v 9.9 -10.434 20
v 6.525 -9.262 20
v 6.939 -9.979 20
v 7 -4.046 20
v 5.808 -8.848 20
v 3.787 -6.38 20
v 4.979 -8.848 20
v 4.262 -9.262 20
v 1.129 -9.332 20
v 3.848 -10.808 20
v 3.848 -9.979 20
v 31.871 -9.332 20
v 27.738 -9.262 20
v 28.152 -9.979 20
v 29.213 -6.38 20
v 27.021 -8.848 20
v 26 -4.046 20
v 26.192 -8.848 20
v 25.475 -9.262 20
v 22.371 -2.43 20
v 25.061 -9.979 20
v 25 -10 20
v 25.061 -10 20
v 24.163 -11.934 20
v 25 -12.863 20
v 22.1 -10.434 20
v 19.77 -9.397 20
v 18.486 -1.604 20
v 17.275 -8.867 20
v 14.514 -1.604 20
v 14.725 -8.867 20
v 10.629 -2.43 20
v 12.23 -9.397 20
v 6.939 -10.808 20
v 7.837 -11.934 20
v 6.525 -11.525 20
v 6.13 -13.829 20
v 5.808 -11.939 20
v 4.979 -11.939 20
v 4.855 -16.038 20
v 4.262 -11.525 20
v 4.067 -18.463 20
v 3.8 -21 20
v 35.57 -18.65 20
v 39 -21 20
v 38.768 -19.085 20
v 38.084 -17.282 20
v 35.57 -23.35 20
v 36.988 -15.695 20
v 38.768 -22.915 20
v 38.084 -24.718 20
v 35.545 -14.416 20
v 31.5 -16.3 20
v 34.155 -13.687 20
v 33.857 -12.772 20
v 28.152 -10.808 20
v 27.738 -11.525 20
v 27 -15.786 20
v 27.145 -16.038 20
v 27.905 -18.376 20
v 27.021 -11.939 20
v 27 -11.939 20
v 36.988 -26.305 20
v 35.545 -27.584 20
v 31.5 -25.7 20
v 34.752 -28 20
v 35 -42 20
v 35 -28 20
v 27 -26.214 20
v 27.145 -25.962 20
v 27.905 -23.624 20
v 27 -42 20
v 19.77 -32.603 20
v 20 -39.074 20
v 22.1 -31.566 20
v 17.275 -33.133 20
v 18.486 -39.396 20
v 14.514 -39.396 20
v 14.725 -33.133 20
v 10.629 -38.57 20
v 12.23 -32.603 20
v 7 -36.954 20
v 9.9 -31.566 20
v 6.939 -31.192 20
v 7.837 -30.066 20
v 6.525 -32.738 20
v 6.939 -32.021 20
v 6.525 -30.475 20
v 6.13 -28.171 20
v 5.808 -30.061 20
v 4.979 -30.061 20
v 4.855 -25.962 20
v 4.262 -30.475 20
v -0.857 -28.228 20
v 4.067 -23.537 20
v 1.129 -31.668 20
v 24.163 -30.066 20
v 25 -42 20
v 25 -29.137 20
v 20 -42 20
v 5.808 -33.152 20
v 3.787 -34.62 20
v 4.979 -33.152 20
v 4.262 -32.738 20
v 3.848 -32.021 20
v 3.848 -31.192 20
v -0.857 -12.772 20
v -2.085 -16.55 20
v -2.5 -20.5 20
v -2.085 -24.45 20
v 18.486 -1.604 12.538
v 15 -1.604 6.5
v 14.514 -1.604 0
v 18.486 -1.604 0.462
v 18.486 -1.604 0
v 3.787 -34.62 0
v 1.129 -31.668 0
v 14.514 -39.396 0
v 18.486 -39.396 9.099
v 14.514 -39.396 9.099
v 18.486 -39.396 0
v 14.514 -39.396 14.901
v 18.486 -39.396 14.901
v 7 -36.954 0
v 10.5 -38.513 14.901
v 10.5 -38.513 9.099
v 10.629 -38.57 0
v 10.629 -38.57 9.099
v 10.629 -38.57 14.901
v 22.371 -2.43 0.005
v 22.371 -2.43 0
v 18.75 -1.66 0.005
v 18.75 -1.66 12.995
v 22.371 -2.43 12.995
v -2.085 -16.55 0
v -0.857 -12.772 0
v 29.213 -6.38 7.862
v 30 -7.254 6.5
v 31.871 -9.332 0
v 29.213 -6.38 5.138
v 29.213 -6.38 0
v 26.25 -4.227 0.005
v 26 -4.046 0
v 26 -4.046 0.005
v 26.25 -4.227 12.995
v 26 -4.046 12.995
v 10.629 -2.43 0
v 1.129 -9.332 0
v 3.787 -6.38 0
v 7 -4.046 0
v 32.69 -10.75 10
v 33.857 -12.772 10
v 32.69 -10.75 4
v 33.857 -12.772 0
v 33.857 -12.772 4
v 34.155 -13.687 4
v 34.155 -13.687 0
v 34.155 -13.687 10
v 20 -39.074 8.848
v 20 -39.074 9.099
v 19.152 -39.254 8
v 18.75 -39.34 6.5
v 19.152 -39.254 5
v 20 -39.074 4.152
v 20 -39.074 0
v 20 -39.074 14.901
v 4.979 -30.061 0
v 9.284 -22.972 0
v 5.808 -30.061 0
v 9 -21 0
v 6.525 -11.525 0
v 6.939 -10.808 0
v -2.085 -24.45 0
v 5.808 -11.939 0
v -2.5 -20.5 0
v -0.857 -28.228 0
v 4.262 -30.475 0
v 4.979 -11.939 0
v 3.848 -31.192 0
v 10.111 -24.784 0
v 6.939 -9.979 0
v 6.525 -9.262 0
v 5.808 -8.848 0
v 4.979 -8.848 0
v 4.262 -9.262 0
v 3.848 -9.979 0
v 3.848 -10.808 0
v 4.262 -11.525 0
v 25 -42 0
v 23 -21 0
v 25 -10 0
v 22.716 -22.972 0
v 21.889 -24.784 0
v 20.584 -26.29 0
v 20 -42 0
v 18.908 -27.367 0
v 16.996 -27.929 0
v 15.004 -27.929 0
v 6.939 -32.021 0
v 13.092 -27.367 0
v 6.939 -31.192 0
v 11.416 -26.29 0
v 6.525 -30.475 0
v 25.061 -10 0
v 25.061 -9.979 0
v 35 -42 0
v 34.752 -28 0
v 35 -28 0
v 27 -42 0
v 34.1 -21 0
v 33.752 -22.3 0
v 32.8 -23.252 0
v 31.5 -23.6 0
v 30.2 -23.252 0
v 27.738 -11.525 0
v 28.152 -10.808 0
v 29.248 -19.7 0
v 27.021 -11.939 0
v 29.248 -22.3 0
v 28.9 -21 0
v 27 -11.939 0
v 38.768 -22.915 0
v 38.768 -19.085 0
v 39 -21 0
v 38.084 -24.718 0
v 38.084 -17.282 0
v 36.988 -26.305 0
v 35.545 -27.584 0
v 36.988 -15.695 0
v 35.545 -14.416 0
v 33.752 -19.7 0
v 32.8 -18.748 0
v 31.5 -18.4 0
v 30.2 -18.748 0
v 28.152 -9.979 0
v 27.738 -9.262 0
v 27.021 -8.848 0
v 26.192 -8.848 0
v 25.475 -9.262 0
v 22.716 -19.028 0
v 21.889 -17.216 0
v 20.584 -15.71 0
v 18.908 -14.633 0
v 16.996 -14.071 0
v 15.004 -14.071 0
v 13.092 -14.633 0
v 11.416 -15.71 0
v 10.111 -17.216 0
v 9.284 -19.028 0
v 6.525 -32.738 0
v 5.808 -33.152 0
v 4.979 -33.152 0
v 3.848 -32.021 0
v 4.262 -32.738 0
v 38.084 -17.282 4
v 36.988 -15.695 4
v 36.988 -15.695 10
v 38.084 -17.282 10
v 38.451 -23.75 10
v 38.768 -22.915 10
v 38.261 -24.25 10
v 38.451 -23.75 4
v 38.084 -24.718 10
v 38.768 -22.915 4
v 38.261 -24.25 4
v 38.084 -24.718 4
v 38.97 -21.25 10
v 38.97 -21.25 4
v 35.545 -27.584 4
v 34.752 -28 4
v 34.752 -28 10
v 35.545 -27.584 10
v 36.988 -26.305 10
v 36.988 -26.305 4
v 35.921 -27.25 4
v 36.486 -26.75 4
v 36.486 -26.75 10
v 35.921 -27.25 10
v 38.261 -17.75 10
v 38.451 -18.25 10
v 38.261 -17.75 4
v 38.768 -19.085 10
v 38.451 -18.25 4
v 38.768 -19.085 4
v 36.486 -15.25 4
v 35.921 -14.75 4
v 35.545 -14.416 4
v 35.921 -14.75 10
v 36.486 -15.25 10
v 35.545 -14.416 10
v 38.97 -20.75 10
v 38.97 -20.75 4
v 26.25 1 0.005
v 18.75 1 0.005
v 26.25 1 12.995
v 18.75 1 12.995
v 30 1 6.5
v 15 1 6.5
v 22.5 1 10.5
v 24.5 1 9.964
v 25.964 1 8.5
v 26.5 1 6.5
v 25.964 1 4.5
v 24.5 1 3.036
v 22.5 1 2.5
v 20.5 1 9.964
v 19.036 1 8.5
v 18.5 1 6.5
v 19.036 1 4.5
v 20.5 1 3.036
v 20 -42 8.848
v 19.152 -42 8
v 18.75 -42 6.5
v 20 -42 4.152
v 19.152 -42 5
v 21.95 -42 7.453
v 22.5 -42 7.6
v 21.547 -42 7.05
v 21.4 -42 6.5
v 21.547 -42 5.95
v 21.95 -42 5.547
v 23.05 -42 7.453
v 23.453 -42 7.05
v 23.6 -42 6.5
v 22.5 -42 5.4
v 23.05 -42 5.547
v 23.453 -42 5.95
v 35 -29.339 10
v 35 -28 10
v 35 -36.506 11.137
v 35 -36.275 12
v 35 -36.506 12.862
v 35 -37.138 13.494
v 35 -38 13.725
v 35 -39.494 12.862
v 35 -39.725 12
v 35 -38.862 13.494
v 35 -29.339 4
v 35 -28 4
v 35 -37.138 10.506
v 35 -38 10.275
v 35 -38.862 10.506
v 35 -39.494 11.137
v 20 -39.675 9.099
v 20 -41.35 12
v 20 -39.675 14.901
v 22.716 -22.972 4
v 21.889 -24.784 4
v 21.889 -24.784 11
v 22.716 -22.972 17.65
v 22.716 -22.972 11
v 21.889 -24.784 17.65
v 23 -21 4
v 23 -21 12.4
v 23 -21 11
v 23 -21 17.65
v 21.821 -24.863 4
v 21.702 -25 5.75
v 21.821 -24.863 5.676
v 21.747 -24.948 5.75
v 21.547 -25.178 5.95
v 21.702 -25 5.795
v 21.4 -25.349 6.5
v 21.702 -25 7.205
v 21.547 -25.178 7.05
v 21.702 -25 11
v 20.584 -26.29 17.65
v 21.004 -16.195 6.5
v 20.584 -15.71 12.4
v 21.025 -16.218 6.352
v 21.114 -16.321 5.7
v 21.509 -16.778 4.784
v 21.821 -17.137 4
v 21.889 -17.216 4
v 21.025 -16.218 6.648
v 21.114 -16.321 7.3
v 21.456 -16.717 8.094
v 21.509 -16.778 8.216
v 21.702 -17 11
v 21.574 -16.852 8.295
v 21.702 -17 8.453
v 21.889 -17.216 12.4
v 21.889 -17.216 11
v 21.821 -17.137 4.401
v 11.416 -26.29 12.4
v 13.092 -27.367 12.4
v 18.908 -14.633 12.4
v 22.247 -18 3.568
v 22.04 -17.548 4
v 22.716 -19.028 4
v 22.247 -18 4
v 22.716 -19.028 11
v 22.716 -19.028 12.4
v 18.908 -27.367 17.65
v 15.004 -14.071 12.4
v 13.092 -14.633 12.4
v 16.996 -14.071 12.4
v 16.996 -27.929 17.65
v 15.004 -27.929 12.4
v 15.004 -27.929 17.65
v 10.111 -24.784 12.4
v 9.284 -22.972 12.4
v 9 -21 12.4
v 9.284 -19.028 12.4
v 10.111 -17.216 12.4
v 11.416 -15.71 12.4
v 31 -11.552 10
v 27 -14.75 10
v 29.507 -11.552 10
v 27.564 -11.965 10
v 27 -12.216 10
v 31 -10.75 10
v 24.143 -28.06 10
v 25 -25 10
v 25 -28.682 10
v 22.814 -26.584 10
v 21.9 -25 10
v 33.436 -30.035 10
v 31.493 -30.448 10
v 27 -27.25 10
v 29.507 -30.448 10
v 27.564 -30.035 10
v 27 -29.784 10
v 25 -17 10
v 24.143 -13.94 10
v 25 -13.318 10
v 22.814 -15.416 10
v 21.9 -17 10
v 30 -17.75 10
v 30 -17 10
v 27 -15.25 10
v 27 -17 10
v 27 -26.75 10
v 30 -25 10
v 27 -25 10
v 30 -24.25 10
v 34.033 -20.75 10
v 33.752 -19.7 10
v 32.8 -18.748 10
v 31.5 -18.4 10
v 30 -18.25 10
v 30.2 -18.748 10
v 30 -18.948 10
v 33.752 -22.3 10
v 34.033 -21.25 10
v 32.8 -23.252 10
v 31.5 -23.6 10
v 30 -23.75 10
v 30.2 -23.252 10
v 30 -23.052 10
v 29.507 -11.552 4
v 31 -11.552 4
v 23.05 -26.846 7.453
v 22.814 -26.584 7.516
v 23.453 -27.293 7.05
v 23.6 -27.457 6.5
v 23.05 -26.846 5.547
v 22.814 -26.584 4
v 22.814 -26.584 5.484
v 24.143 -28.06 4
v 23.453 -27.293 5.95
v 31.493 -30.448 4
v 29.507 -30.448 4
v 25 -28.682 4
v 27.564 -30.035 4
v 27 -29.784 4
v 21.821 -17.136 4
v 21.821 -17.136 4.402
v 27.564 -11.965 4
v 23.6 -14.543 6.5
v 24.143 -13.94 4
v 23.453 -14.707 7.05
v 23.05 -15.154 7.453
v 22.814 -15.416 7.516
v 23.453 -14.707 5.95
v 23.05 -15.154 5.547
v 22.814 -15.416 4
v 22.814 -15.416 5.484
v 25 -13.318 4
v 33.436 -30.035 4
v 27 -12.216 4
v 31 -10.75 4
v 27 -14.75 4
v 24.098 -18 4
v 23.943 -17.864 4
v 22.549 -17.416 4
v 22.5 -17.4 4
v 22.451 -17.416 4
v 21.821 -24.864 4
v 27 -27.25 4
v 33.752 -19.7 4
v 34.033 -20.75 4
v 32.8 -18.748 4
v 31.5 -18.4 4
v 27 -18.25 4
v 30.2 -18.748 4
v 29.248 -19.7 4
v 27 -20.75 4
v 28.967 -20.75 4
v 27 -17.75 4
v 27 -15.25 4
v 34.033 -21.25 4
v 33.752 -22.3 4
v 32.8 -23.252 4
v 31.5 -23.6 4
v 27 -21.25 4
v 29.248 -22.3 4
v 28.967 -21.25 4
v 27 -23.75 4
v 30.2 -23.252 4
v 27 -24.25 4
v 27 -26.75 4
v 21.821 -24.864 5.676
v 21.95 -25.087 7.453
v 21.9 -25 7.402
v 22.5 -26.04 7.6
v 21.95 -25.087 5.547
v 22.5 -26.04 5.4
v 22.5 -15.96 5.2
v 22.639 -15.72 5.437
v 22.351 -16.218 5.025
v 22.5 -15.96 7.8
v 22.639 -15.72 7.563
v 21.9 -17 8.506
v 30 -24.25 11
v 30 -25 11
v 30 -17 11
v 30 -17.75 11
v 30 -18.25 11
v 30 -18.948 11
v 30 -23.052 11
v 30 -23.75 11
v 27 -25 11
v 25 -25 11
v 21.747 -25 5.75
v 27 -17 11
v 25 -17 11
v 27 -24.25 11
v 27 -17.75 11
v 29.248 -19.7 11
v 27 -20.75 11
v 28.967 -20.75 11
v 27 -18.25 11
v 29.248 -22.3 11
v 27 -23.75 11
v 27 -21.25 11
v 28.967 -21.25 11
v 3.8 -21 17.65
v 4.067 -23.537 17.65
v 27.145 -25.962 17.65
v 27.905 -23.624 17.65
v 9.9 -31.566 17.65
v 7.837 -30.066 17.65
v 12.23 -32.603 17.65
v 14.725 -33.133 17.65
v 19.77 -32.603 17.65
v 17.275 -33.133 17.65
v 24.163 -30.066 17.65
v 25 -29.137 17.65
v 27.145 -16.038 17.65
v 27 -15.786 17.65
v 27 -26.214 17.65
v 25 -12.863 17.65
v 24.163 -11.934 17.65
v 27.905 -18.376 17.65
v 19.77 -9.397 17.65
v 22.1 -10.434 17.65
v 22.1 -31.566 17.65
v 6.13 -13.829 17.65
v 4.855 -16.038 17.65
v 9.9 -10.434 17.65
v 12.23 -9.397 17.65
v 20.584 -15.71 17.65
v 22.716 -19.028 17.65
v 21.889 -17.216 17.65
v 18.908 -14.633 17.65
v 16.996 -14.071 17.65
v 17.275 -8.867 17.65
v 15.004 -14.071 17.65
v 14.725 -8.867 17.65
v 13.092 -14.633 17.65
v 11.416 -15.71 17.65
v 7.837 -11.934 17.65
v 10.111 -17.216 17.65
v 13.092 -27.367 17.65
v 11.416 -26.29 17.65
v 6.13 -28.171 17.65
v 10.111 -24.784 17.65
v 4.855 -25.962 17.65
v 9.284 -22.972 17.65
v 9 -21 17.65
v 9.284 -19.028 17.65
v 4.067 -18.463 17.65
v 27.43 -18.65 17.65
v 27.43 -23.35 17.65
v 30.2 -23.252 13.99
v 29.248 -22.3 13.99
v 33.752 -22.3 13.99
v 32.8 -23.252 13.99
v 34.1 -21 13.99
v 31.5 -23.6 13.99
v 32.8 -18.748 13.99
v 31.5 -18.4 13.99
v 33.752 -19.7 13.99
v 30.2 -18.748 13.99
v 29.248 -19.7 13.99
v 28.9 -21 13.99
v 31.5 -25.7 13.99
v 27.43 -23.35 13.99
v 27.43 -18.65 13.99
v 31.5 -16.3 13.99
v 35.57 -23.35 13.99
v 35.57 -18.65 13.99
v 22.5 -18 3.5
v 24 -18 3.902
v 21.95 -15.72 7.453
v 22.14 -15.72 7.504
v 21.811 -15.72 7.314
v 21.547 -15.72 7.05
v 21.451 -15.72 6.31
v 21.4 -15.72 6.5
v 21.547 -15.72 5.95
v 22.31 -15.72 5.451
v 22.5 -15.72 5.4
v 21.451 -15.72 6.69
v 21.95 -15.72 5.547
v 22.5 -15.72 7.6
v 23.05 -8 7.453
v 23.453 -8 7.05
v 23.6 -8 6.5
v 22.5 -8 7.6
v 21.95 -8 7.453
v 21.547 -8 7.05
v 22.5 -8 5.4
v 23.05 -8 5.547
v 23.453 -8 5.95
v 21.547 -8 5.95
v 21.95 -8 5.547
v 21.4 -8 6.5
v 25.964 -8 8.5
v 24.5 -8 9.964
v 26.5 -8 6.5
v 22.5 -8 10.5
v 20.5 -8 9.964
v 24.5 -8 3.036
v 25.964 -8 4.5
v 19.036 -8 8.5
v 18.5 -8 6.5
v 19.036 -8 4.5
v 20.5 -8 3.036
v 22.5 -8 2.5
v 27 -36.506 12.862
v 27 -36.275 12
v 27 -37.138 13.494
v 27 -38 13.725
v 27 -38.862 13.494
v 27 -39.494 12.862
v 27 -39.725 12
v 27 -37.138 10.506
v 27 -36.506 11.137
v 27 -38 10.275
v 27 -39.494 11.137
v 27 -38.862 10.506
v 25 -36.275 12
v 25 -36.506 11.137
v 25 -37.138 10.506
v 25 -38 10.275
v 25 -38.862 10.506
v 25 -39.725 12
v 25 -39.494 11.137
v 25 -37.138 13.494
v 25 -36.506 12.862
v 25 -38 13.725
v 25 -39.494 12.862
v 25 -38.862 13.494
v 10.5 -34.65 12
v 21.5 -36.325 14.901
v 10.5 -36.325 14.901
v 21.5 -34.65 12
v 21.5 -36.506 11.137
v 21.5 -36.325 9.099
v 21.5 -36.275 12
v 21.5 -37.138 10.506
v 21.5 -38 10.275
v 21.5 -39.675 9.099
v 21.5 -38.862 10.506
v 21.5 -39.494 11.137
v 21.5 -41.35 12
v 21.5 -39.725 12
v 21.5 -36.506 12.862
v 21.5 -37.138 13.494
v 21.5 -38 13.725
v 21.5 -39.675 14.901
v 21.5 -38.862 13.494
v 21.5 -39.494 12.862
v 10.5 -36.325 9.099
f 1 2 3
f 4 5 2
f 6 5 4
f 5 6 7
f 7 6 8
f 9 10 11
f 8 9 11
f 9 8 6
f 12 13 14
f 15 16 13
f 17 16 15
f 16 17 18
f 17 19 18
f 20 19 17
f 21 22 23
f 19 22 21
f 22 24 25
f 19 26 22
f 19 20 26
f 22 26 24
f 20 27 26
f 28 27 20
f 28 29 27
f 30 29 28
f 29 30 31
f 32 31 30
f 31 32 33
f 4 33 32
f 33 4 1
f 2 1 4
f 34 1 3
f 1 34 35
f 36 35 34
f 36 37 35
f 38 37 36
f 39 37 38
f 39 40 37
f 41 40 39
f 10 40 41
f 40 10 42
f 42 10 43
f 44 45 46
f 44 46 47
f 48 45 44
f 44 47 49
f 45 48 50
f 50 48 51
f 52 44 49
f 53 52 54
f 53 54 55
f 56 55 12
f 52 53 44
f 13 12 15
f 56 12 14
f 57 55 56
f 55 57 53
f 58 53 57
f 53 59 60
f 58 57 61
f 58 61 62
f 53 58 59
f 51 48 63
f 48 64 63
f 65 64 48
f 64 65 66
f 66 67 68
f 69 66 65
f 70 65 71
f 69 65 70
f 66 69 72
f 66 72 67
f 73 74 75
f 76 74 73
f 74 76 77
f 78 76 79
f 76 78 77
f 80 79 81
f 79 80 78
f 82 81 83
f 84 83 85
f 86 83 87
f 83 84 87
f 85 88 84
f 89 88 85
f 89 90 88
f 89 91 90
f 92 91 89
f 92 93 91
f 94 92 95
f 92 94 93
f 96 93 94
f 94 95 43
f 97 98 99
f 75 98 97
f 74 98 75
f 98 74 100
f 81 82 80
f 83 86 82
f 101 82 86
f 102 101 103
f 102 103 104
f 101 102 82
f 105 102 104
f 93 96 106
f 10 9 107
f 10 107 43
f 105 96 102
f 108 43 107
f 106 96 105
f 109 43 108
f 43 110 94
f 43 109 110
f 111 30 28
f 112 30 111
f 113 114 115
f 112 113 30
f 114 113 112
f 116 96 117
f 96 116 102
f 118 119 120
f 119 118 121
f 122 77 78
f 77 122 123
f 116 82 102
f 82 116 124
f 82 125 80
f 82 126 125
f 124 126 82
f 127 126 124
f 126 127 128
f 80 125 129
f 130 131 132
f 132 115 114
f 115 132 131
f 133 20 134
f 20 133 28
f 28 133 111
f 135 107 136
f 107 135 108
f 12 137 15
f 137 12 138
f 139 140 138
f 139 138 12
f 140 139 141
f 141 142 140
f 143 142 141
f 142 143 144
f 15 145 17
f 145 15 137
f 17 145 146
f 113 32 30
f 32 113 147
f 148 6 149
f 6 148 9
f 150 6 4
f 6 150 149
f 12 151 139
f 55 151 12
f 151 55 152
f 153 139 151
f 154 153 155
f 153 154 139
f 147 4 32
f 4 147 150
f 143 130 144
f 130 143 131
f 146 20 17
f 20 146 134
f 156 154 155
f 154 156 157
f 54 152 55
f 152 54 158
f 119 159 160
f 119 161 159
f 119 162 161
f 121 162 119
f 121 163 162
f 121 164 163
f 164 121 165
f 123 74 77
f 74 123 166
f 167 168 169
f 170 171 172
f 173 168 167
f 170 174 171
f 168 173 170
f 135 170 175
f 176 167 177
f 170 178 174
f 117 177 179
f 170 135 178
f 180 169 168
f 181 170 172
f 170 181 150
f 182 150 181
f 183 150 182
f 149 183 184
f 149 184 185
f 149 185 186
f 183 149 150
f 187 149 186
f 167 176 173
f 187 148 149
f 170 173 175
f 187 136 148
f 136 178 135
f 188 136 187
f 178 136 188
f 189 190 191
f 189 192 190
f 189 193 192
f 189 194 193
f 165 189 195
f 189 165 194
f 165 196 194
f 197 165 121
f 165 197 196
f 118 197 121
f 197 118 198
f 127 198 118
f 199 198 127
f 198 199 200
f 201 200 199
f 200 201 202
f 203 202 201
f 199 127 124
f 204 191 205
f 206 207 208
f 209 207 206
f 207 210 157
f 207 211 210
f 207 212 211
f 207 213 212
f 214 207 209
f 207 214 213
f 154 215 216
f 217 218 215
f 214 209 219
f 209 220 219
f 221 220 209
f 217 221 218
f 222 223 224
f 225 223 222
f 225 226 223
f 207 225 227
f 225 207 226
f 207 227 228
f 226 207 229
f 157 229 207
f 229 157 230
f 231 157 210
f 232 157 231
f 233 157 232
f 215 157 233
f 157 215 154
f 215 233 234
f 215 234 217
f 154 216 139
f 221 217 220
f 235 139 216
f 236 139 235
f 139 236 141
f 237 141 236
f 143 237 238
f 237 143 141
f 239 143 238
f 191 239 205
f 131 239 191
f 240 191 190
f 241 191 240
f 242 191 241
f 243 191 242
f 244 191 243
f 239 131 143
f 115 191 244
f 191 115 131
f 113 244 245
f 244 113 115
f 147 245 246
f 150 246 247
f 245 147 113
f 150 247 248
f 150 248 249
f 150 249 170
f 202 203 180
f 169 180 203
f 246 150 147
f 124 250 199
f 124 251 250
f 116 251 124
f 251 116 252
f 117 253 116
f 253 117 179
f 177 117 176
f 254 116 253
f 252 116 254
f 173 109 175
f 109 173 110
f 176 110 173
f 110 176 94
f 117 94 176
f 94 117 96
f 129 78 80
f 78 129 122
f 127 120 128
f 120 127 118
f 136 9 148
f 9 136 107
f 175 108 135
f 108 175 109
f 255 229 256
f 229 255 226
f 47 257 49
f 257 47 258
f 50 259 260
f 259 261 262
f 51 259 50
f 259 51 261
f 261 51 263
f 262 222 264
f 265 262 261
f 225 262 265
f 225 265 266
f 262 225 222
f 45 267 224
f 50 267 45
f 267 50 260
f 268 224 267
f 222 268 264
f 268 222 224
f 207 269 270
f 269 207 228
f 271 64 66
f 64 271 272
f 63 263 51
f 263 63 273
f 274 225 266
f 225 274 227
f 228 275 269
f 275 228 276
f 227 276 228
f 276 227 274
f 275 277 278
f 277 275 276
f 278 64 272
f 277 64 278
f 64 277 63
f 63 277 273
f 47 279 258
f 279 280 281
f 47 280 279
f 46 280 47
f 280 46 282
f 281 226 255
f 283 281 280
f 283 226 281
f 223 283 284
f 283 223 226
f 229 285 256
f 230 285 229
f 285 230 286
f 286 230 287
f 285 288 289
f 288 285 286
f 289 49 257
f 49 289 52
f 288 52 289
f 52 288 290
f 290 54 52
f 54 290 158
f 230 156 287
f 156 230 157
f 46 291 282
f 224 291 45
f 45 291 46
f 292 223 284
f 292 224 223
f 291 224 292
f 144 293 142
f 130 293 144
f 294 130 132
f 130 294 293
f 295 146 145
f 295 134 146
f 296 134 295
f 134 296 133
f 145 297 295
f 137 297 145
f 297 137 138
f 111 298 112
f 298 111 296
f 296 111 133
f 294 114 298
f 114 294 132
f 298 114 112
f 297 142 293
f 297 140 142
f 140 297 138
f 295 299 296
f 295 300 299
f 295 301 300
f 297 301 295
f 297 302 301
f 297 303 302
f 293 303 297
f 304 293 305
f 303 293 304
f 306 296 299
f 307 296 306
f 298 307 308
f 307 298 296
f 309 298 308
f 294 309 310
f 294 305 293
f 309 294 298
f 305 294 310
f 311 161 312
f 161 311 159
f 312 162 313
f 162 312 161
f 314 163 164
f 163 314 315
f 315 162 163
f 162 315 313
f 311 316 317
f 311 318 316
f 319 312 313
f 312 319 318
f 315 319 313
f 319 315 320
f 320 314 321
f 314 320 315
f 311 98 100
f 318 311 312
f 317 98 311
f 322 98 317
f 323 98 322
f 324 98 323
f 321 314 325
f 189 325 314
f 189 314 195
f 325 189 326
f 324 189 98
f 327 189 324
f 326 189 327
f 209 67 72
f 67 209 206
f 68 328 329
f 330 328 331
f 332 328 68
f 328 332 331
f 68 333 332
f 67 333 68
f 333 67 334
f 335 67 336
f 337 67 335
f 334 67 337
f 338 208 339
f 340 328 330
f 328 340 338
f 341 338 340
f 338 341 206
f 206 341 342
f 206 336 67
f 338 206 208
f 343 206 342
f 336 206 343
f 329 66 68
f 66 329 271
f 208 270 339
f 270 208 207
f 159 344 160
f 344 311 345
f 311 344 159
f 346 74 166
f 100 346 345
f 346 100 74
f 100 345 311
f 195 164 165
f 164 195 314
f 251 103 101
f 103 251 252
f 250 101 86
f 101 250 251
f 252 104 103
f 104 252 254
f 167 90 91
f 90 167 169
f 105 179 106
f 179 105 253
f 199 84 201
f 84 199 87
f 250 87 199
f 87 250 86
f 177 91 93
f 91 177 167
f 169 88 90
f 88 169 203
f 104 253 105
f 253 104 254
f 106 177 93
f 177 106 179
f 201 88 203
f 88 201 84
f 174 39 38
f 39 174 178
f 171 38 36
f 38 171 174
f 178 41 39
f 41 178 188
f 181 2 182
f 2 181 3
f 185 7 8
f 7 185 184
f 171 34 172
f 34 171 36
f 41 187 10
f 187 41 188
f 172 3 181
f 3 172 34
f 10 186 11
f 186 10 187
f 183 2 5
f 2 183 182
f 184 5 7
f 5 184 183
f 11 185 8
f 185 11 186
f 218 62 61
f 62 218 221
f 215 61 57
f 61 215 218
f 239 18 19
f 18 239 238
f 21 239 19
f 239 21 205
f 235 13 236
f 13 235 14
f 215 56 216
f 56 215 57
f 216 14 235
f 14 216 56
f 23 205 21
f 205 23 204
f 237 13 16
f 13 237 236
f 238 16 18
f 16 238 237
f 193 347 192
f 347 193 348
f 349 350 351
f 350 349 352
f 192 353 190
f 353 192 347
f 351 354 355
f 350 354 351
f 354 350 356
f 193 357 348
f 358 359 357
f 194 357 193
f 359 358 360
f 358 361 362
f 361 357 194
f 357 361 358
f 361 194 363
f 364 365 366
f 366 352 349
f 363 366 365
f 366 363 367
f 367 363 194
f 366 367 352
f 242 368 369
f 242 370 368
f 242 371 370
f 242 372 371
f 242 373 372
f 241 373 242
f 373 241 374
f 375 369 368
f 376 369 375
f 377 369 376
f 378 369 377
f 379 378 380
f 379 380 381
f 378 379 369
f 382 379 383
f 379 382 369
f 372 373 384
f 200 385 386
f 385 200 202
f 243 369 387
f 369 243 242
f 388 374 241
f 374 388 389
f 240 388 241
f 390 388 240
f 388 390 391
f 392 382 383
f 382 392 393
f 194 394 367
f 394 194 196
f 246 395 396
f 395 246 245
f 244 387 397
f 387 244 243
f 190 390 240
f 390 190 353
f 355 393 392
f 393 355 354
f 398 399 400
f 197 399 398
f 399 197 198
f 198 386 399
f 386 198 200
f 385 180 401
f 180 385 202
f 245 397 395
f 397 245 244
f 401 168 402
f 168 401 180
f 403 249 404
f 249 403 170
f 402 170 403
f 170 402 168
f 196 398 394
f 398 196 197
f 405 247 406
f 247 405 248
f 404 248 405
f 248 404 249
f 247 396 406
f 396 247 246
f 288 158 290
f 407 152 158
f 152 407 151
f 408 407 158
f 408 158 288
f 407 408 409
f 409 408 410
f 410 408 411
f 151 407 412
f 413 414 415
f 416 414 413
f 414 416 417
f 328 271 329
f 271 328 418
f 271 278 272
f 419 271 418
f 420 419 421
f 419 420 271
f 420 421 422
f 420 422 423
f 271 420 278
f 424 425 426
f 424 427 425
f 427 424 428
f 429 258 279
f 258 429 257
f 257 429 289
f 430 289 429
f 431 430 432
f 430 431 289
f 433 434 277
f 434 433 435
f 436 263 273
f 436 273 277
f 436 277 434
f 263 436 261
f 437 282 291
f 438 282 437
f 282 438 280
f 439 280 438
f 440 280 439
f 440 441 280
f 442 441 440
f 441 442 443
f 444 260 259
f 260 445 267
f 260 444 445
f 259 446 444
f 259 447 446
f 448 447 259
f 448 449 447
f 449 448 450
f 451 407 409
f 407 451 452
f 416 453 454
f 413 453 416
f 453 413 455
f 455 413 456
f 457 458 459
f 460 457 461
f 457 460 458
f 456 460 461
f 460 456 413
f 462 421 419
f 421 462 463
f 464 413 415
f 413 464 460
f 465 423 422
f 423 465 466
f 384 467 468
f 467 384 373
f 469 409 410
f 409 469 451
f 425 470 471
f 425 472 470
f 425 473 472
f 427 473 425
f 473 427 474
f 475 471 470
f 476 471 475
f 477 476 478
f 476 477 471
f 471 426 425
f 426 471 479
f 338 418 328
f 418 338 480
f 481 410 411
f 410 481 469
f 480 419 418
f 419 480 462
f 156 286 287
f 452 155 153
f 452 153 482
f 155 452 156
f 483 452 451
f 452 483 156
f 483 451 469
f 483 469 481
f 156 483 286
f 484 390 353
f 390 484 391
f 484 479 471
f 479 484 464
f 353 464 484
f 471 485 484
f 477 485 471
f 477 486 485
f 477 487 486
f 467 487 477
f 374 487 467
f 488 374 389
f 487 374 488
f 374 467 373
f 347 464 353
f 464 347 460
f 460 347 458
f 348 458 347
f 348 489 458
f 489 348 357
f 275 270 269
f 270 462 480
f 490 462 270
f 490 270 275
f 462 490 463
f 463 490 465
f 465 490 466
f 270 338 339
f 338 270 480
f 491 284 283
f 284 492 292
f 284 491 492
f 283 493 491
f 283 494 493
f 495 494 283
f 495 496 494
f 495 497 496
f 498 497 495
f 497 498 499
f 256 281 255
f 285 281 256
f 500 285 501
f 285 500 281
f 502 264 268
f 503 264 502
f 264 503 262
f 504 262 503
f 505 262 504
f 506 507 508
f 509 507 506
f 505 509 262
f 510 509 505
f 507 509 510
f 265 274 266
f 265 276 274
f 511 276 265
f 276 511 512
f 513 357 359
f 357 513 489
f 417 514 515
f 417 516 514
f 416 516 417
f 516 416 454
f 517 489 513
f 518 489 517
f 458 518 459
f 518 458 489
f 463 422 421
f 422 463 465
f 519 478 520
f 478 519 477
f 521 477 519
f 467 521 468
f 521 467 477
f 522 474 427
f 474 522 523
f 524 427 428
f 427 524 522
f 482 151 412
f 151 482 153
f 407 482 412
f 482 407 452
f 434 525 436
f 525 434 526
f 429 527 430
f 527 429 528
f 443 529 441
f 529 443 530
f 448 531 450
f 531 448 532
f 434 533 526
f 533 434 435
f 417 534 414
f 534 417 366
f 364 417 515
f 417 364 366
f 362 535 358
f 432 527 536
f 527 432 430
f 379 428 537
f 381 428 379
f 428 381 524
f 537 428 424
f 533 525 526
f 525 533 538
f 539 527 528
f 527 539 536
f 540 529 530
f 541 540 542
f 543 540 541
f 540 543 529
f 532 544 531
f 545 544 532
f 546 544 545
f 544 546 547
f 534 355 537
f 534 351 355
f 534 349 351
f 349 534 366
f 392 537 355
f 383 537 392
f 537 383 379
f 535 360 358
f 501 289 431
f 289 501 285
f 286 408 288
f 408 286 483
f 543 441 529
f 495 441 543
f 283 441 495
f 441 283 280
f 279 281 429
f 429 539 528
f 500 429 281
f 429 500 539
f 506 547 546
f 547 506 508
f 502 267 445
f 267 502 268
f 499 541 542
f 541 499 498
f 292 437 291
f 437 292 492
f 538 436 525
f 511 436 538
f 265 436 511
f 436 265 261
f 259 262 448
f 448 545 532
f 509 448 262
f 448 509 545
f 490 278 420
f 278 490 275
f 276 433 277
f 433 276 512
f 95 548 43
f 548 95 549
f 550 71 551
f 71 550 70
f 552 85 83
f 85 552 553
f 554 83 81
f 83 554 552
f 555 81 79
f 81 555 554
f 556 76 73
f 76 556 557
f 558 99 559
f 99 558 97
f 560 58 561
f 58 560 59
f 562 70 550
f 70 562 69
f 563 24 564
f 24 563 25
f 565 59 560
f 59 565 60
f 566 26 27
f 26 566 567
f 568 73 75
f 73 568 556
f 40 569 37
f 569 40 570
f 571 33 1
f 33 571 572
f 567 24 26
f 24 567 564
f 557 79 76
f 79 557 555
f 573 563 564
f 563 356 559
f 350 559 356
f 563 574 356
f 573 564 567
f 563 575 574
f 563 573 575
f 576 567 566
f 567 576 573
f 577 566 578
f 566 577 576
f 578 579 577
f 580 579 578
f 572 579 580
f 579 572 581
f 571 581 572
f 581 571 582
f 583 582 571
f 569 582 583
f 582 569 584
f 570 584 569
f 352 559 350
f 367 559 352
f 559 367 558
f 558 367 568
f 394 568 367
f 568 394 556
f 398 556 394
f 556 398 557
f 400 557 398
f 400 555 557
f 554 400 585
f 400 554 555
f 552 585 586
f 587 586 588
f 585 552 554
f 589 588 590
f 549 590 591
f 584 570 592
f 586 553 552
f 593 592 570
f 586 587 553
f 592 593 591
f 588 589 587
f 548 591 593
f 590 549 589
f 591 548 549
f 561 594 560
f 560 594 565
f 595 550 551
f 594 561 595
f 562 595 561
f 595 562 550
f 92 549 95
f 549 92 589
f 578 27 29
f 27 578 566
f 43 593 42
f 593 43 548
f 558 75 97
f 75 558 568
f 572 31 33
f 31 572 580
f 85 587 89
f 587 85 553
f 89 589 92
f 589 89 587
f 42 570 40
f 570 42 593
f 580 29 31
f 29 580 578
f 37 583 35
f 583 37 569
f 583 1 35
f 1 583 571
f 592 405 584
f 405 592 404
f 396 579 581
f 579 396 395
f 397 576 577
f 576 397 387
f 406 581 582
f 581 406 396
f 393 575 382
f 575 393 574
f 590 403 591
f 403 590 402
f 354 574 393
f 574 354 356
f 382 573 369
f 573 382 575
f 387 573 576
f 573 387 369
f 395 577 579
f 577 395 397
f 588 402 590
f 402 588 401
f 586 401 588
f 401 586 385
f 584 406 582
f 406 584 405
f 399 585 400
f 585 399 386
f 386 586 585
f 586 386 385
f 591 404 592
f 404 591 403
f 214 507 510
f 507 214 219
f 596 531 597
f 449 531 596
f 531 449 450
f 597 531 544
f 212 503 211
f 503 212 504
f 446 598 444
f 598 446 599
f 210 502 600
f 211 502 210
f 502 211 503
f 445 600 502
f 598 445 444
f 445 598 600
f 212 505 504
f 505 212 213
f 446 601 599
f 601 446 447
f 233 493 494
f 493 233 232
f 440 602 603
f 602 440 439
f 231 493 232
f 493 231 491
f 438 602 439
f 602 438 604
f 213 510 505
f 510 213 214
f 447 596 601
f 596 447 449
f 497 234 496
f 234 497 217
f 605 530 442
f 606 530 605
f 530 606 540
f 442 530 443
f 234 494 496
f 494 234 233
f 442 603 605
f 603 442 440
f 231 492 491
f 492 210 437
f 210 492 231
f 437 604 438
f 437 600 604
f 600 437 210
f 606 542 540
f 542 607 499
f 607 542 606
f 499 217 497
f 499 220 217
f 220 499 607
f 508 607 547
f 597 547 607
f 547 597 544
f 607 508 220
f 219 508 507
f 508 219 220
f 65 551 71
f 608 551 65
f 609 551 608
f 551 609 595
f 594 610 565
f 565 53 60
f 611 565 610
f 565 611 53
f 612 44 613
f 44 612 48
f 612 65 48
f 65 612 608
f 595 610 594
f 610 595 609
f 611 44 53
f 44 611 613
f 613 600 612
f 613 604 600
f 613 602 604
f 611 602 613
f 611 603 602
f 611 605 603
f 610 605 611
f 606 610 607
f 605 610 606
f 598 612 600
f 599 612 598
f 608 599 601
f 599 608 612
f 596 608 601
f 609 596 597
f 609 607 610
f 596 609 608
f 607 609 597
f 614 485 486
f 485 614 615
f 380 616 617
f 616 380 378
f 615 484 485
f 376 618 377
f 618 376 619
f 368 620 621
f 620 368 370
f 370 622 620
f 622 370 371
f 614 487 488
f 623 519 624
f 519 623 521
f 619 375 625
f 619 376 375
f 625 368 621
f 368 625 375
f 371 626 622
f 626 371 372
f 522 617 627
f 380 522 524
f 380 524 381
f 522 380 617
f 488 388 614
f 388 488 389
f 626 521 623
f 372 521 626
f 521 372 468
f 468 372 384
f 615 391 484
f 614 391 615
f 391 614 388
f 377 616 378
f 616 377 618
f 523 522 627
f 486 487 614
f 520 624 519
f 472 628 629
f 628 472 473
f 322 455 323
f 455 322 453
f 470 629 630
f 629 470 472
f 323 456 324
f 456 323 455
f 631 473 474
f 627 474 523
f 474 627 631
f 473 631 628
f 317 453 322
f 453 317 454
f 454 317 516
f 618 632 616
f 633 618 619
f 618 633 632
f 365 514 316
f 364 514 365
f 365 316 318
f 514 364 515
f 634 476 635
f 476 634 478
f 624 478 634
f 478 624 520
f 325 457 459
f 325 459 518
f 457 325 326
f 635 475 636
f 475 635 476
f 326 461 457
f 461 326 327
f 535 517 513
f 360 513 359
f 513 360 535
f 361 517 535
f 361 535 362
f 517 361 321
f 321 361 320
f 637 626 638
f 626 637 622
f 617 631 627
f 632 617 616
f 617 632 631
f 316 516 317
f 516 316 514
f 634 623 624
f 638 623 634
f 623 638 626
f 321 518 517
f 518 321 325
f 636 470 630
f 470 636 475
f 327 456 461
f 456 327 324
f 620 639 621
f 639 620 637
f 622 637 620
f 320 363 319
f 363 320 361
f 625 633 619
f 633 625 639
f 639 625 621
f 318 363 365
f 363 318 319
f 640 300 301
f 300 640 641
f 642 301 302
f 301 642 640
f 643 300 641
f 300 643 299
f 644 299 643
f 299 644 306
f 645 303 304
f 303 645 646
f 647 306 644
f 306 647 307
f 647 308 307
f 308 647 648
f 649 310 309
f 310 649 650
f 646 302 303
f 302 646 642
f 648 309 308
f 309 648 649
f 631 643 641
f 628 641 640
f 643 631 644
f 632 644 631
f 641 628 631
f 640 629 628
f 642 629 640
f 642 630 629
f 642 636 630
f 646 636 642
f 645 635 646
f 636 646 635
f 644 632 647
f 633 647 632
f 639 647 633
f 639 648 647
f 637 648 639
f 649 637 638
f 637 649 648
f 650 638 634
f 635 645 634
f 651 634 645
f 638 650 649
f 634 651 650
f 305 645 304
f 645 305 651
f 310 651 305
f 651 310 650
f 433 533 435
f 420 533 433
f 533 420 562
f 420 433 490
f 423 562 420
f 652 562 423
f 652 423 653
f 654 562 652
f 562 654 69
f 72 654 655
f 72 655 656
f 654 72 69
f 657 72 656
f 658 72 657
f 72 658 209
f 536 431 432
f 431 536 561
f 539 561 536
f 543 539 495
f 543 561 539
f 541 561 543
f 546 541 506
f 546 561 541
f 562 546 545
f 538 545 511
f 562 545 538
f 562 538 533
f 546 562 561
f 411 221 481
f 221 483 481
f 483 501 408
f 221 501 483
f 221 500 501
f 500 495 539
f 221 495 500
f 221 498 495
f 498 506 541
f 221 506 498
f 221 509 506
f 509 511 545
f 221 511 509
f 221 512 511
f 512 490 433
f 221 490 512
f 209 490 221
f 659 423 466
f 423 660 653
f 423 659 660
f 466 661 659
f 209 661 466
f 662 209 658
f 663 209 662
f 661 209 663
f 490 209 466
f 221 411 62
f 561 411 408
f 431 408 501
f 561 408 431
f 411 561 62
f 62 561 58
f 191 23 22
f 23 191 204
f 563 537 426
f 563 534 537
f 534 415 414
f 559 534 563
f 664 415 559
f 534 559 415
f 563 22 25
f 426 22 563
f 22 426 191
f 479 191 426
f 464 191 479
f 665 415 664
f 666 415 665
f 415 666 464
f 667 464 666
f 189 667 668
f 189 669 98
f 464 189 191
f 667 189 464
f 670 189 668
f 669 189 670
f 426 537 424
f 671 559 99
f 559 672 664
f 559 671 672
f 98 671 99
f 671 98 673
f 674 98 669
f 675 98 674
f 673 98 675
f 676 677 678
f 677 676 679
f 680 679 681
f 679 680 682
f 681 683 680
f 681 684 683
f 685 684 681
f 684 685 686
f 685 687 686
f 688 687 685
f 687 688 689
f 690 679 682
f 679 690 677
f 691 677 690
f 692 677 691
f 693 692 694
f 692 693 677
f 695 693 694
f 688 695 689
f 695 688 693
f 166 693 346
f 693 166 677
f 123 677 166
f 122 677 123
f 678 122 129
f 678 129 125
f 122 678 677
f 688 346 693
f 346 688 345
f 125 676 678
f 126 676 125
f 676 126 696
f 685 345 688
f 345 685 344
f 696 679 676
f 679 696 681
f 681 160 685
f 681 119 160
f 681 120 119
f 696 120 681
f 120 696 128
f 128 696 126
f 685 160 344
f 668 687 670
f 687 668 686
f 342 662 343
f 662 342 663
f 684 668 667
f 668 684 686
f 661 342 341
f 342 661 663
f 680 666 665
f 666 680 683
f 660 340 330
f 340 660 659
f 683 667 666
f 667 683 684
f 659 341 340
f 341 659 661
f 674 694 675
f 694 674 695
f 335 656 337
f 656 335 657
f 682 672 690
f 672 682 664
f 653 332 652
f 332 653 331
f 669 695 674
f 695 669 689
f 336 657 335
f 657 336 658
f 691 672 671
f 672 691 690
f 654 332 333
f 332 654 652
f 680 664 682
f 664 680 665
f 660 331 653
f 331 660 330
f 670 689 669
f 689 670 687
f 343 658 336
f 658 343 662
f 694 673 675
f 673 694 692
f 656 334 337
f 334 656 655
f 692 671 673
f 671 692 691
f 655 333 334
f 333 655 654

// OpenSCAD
// file: configuration.scad
// Increase this if your slicer or printer make holes too tight.
extra_radius = 0.1;

// OD = outside diameter, corner to corner.
m3_nut_od = 6.1;
m3_nut_radius = m3_nut_od/2 + 0.2 + extra_radius;
m3_washer_radius = 3.5 + extra_radius;

// Major diameter of metric 3mm thread.
m3_major = 2.85;
m3_radius = m3_major/2 + extra_radius;
m3_wide_radius = m3_major/2 + extra_radius + 0.2;

// NEMA17 stepper motors.
motor_shaft_diameter = 5;
motor_shaft_radius = motor_shaft_diameter/2 + extra_radius;

// Frame brackets. M3x8mm screws work best with 3.6 mm brackets.
thickness = 3.6;

// OpenBeam or Misumi. Currently only 15x15 mm, but there is a plan
// to make models more parametric and allow 20x20 mm in the future.
extrusion = 15;

// Placement for the NEMA17 stepper motors.
motor_offset = 44;
motor_length = 47;
// main file
// Based on "Makergear Filament drive goes Bowden" by Luke321
// http://www.thingiverse.com/thing:63674

include <configuration.scad>;

filament_offset = 22.5;

module extruder() {
  rotate([90, 0, 0]) difference() {
    union() {
      //main cylinder
      translate([16.5,20,20.5]) rotate([90,0,0]) cylinder(h=20, r=19);

      //bearing mount

      translate([31,20,21]) rotate([90,0,0]) cylinder (h=20, r=8);

      //pushfit/pneufit mount
      translate([filament_offset, 6.5, 13])
        cylinder(r=7.5, h=28, center=true, $fn=6);

      //filament support
      translate([21.75,6.5,34]) rotate([0,0,0]) cylinder (h=8, r=3, $fn=12);

      //clamp
      translate([20, 0, 28]) cube([15, 20, 14]);
    }

    //pulley opening
    translate([16,21,21]) rotate([90,0,0]){
      cylinder (h=22, r=7);

      rotate([0,0,45]) {
        //translate([14,0,0]) cylinder(h=22, r=1.6, $fn=12);
        translate([0,15,0]) cylinder(h=22, r=1.6, $fn=12);
        translate([-15,0,0]) cylinder(h=22, r=1.6, $fn=12);
        translate([0,-15,0]) cylinder(h=22, r=1.6, $fn=12);
      }
    }

    //gearhead indentation
#    translate([16,21,21]) rotate([90,0,0]) cylinder (h=3.35, r=12.2);

    //pulley hub indentation
    translate([16,20-2,21]) rotate([90,0,0]) cylinder (h=5.6, r=7);

    //bearing screws
#    translate([31.5,21,21]) rotate([90,0,0]) cylinder (h=22, r=2.6, $fn=12);
#    translate([31.5,22,21]) rotate([90,30,0]) cylinder (h=8.01, r=4.7, $fn=6);

    //bearing
   difference() {
      union() {
#       translate([30.5,10,21]) rotate([90,0,0]) cylinder (h=6, r=9.5);

       translate([31,9-5,21-8.25-2]) cube([20, 6, 18.5]);
        //opening between bearing and pulley
        translate([20,11-5.25,21-8.25+3.25+1]) cube([10, 5.25, 8]);
      }
      //removable supports
      for (z = [15:3:27]) {
        translate([36, 10, z])  cube([20, 20, 0.5], center=true);
      }
    }

    //filament path chamfer
    translate([filament_offset,6.5,15]) rotate([0,0,0]) 
      cylinder(h=3, r1=0.5, r2=3, $fn=12);

    //filament path
    translate([filament_offset,6.5,-10]) rotate([0,0,0]) 
      cylinder(h=60, r=1.1, $fn=12);

    //pushfit/pneufit mount
//color("blue")    translate([filament_offset, 6.5, -2])  cylinder(r=4.9, h=10, $fn=12);
color("blue")    translate([filament_offset, 6.5, -2])  cylinder(r=4, h=10, $fn=12);

    //clamp slit
    translate([25,-1,10]) cube([2, 22, 35]);
    //clamp nut
    translate([10.5,12,38]) rotate([0,90,0])
      cylinder(h=11, r=m3_nut_radius, $fn=6);
    //clamp screw hole
#    translate([15,12,38]) rotate([0,90,0])
      cylinder(h=25, r=m3_wide_radius, $fn=12);
  }
}

extruder();
